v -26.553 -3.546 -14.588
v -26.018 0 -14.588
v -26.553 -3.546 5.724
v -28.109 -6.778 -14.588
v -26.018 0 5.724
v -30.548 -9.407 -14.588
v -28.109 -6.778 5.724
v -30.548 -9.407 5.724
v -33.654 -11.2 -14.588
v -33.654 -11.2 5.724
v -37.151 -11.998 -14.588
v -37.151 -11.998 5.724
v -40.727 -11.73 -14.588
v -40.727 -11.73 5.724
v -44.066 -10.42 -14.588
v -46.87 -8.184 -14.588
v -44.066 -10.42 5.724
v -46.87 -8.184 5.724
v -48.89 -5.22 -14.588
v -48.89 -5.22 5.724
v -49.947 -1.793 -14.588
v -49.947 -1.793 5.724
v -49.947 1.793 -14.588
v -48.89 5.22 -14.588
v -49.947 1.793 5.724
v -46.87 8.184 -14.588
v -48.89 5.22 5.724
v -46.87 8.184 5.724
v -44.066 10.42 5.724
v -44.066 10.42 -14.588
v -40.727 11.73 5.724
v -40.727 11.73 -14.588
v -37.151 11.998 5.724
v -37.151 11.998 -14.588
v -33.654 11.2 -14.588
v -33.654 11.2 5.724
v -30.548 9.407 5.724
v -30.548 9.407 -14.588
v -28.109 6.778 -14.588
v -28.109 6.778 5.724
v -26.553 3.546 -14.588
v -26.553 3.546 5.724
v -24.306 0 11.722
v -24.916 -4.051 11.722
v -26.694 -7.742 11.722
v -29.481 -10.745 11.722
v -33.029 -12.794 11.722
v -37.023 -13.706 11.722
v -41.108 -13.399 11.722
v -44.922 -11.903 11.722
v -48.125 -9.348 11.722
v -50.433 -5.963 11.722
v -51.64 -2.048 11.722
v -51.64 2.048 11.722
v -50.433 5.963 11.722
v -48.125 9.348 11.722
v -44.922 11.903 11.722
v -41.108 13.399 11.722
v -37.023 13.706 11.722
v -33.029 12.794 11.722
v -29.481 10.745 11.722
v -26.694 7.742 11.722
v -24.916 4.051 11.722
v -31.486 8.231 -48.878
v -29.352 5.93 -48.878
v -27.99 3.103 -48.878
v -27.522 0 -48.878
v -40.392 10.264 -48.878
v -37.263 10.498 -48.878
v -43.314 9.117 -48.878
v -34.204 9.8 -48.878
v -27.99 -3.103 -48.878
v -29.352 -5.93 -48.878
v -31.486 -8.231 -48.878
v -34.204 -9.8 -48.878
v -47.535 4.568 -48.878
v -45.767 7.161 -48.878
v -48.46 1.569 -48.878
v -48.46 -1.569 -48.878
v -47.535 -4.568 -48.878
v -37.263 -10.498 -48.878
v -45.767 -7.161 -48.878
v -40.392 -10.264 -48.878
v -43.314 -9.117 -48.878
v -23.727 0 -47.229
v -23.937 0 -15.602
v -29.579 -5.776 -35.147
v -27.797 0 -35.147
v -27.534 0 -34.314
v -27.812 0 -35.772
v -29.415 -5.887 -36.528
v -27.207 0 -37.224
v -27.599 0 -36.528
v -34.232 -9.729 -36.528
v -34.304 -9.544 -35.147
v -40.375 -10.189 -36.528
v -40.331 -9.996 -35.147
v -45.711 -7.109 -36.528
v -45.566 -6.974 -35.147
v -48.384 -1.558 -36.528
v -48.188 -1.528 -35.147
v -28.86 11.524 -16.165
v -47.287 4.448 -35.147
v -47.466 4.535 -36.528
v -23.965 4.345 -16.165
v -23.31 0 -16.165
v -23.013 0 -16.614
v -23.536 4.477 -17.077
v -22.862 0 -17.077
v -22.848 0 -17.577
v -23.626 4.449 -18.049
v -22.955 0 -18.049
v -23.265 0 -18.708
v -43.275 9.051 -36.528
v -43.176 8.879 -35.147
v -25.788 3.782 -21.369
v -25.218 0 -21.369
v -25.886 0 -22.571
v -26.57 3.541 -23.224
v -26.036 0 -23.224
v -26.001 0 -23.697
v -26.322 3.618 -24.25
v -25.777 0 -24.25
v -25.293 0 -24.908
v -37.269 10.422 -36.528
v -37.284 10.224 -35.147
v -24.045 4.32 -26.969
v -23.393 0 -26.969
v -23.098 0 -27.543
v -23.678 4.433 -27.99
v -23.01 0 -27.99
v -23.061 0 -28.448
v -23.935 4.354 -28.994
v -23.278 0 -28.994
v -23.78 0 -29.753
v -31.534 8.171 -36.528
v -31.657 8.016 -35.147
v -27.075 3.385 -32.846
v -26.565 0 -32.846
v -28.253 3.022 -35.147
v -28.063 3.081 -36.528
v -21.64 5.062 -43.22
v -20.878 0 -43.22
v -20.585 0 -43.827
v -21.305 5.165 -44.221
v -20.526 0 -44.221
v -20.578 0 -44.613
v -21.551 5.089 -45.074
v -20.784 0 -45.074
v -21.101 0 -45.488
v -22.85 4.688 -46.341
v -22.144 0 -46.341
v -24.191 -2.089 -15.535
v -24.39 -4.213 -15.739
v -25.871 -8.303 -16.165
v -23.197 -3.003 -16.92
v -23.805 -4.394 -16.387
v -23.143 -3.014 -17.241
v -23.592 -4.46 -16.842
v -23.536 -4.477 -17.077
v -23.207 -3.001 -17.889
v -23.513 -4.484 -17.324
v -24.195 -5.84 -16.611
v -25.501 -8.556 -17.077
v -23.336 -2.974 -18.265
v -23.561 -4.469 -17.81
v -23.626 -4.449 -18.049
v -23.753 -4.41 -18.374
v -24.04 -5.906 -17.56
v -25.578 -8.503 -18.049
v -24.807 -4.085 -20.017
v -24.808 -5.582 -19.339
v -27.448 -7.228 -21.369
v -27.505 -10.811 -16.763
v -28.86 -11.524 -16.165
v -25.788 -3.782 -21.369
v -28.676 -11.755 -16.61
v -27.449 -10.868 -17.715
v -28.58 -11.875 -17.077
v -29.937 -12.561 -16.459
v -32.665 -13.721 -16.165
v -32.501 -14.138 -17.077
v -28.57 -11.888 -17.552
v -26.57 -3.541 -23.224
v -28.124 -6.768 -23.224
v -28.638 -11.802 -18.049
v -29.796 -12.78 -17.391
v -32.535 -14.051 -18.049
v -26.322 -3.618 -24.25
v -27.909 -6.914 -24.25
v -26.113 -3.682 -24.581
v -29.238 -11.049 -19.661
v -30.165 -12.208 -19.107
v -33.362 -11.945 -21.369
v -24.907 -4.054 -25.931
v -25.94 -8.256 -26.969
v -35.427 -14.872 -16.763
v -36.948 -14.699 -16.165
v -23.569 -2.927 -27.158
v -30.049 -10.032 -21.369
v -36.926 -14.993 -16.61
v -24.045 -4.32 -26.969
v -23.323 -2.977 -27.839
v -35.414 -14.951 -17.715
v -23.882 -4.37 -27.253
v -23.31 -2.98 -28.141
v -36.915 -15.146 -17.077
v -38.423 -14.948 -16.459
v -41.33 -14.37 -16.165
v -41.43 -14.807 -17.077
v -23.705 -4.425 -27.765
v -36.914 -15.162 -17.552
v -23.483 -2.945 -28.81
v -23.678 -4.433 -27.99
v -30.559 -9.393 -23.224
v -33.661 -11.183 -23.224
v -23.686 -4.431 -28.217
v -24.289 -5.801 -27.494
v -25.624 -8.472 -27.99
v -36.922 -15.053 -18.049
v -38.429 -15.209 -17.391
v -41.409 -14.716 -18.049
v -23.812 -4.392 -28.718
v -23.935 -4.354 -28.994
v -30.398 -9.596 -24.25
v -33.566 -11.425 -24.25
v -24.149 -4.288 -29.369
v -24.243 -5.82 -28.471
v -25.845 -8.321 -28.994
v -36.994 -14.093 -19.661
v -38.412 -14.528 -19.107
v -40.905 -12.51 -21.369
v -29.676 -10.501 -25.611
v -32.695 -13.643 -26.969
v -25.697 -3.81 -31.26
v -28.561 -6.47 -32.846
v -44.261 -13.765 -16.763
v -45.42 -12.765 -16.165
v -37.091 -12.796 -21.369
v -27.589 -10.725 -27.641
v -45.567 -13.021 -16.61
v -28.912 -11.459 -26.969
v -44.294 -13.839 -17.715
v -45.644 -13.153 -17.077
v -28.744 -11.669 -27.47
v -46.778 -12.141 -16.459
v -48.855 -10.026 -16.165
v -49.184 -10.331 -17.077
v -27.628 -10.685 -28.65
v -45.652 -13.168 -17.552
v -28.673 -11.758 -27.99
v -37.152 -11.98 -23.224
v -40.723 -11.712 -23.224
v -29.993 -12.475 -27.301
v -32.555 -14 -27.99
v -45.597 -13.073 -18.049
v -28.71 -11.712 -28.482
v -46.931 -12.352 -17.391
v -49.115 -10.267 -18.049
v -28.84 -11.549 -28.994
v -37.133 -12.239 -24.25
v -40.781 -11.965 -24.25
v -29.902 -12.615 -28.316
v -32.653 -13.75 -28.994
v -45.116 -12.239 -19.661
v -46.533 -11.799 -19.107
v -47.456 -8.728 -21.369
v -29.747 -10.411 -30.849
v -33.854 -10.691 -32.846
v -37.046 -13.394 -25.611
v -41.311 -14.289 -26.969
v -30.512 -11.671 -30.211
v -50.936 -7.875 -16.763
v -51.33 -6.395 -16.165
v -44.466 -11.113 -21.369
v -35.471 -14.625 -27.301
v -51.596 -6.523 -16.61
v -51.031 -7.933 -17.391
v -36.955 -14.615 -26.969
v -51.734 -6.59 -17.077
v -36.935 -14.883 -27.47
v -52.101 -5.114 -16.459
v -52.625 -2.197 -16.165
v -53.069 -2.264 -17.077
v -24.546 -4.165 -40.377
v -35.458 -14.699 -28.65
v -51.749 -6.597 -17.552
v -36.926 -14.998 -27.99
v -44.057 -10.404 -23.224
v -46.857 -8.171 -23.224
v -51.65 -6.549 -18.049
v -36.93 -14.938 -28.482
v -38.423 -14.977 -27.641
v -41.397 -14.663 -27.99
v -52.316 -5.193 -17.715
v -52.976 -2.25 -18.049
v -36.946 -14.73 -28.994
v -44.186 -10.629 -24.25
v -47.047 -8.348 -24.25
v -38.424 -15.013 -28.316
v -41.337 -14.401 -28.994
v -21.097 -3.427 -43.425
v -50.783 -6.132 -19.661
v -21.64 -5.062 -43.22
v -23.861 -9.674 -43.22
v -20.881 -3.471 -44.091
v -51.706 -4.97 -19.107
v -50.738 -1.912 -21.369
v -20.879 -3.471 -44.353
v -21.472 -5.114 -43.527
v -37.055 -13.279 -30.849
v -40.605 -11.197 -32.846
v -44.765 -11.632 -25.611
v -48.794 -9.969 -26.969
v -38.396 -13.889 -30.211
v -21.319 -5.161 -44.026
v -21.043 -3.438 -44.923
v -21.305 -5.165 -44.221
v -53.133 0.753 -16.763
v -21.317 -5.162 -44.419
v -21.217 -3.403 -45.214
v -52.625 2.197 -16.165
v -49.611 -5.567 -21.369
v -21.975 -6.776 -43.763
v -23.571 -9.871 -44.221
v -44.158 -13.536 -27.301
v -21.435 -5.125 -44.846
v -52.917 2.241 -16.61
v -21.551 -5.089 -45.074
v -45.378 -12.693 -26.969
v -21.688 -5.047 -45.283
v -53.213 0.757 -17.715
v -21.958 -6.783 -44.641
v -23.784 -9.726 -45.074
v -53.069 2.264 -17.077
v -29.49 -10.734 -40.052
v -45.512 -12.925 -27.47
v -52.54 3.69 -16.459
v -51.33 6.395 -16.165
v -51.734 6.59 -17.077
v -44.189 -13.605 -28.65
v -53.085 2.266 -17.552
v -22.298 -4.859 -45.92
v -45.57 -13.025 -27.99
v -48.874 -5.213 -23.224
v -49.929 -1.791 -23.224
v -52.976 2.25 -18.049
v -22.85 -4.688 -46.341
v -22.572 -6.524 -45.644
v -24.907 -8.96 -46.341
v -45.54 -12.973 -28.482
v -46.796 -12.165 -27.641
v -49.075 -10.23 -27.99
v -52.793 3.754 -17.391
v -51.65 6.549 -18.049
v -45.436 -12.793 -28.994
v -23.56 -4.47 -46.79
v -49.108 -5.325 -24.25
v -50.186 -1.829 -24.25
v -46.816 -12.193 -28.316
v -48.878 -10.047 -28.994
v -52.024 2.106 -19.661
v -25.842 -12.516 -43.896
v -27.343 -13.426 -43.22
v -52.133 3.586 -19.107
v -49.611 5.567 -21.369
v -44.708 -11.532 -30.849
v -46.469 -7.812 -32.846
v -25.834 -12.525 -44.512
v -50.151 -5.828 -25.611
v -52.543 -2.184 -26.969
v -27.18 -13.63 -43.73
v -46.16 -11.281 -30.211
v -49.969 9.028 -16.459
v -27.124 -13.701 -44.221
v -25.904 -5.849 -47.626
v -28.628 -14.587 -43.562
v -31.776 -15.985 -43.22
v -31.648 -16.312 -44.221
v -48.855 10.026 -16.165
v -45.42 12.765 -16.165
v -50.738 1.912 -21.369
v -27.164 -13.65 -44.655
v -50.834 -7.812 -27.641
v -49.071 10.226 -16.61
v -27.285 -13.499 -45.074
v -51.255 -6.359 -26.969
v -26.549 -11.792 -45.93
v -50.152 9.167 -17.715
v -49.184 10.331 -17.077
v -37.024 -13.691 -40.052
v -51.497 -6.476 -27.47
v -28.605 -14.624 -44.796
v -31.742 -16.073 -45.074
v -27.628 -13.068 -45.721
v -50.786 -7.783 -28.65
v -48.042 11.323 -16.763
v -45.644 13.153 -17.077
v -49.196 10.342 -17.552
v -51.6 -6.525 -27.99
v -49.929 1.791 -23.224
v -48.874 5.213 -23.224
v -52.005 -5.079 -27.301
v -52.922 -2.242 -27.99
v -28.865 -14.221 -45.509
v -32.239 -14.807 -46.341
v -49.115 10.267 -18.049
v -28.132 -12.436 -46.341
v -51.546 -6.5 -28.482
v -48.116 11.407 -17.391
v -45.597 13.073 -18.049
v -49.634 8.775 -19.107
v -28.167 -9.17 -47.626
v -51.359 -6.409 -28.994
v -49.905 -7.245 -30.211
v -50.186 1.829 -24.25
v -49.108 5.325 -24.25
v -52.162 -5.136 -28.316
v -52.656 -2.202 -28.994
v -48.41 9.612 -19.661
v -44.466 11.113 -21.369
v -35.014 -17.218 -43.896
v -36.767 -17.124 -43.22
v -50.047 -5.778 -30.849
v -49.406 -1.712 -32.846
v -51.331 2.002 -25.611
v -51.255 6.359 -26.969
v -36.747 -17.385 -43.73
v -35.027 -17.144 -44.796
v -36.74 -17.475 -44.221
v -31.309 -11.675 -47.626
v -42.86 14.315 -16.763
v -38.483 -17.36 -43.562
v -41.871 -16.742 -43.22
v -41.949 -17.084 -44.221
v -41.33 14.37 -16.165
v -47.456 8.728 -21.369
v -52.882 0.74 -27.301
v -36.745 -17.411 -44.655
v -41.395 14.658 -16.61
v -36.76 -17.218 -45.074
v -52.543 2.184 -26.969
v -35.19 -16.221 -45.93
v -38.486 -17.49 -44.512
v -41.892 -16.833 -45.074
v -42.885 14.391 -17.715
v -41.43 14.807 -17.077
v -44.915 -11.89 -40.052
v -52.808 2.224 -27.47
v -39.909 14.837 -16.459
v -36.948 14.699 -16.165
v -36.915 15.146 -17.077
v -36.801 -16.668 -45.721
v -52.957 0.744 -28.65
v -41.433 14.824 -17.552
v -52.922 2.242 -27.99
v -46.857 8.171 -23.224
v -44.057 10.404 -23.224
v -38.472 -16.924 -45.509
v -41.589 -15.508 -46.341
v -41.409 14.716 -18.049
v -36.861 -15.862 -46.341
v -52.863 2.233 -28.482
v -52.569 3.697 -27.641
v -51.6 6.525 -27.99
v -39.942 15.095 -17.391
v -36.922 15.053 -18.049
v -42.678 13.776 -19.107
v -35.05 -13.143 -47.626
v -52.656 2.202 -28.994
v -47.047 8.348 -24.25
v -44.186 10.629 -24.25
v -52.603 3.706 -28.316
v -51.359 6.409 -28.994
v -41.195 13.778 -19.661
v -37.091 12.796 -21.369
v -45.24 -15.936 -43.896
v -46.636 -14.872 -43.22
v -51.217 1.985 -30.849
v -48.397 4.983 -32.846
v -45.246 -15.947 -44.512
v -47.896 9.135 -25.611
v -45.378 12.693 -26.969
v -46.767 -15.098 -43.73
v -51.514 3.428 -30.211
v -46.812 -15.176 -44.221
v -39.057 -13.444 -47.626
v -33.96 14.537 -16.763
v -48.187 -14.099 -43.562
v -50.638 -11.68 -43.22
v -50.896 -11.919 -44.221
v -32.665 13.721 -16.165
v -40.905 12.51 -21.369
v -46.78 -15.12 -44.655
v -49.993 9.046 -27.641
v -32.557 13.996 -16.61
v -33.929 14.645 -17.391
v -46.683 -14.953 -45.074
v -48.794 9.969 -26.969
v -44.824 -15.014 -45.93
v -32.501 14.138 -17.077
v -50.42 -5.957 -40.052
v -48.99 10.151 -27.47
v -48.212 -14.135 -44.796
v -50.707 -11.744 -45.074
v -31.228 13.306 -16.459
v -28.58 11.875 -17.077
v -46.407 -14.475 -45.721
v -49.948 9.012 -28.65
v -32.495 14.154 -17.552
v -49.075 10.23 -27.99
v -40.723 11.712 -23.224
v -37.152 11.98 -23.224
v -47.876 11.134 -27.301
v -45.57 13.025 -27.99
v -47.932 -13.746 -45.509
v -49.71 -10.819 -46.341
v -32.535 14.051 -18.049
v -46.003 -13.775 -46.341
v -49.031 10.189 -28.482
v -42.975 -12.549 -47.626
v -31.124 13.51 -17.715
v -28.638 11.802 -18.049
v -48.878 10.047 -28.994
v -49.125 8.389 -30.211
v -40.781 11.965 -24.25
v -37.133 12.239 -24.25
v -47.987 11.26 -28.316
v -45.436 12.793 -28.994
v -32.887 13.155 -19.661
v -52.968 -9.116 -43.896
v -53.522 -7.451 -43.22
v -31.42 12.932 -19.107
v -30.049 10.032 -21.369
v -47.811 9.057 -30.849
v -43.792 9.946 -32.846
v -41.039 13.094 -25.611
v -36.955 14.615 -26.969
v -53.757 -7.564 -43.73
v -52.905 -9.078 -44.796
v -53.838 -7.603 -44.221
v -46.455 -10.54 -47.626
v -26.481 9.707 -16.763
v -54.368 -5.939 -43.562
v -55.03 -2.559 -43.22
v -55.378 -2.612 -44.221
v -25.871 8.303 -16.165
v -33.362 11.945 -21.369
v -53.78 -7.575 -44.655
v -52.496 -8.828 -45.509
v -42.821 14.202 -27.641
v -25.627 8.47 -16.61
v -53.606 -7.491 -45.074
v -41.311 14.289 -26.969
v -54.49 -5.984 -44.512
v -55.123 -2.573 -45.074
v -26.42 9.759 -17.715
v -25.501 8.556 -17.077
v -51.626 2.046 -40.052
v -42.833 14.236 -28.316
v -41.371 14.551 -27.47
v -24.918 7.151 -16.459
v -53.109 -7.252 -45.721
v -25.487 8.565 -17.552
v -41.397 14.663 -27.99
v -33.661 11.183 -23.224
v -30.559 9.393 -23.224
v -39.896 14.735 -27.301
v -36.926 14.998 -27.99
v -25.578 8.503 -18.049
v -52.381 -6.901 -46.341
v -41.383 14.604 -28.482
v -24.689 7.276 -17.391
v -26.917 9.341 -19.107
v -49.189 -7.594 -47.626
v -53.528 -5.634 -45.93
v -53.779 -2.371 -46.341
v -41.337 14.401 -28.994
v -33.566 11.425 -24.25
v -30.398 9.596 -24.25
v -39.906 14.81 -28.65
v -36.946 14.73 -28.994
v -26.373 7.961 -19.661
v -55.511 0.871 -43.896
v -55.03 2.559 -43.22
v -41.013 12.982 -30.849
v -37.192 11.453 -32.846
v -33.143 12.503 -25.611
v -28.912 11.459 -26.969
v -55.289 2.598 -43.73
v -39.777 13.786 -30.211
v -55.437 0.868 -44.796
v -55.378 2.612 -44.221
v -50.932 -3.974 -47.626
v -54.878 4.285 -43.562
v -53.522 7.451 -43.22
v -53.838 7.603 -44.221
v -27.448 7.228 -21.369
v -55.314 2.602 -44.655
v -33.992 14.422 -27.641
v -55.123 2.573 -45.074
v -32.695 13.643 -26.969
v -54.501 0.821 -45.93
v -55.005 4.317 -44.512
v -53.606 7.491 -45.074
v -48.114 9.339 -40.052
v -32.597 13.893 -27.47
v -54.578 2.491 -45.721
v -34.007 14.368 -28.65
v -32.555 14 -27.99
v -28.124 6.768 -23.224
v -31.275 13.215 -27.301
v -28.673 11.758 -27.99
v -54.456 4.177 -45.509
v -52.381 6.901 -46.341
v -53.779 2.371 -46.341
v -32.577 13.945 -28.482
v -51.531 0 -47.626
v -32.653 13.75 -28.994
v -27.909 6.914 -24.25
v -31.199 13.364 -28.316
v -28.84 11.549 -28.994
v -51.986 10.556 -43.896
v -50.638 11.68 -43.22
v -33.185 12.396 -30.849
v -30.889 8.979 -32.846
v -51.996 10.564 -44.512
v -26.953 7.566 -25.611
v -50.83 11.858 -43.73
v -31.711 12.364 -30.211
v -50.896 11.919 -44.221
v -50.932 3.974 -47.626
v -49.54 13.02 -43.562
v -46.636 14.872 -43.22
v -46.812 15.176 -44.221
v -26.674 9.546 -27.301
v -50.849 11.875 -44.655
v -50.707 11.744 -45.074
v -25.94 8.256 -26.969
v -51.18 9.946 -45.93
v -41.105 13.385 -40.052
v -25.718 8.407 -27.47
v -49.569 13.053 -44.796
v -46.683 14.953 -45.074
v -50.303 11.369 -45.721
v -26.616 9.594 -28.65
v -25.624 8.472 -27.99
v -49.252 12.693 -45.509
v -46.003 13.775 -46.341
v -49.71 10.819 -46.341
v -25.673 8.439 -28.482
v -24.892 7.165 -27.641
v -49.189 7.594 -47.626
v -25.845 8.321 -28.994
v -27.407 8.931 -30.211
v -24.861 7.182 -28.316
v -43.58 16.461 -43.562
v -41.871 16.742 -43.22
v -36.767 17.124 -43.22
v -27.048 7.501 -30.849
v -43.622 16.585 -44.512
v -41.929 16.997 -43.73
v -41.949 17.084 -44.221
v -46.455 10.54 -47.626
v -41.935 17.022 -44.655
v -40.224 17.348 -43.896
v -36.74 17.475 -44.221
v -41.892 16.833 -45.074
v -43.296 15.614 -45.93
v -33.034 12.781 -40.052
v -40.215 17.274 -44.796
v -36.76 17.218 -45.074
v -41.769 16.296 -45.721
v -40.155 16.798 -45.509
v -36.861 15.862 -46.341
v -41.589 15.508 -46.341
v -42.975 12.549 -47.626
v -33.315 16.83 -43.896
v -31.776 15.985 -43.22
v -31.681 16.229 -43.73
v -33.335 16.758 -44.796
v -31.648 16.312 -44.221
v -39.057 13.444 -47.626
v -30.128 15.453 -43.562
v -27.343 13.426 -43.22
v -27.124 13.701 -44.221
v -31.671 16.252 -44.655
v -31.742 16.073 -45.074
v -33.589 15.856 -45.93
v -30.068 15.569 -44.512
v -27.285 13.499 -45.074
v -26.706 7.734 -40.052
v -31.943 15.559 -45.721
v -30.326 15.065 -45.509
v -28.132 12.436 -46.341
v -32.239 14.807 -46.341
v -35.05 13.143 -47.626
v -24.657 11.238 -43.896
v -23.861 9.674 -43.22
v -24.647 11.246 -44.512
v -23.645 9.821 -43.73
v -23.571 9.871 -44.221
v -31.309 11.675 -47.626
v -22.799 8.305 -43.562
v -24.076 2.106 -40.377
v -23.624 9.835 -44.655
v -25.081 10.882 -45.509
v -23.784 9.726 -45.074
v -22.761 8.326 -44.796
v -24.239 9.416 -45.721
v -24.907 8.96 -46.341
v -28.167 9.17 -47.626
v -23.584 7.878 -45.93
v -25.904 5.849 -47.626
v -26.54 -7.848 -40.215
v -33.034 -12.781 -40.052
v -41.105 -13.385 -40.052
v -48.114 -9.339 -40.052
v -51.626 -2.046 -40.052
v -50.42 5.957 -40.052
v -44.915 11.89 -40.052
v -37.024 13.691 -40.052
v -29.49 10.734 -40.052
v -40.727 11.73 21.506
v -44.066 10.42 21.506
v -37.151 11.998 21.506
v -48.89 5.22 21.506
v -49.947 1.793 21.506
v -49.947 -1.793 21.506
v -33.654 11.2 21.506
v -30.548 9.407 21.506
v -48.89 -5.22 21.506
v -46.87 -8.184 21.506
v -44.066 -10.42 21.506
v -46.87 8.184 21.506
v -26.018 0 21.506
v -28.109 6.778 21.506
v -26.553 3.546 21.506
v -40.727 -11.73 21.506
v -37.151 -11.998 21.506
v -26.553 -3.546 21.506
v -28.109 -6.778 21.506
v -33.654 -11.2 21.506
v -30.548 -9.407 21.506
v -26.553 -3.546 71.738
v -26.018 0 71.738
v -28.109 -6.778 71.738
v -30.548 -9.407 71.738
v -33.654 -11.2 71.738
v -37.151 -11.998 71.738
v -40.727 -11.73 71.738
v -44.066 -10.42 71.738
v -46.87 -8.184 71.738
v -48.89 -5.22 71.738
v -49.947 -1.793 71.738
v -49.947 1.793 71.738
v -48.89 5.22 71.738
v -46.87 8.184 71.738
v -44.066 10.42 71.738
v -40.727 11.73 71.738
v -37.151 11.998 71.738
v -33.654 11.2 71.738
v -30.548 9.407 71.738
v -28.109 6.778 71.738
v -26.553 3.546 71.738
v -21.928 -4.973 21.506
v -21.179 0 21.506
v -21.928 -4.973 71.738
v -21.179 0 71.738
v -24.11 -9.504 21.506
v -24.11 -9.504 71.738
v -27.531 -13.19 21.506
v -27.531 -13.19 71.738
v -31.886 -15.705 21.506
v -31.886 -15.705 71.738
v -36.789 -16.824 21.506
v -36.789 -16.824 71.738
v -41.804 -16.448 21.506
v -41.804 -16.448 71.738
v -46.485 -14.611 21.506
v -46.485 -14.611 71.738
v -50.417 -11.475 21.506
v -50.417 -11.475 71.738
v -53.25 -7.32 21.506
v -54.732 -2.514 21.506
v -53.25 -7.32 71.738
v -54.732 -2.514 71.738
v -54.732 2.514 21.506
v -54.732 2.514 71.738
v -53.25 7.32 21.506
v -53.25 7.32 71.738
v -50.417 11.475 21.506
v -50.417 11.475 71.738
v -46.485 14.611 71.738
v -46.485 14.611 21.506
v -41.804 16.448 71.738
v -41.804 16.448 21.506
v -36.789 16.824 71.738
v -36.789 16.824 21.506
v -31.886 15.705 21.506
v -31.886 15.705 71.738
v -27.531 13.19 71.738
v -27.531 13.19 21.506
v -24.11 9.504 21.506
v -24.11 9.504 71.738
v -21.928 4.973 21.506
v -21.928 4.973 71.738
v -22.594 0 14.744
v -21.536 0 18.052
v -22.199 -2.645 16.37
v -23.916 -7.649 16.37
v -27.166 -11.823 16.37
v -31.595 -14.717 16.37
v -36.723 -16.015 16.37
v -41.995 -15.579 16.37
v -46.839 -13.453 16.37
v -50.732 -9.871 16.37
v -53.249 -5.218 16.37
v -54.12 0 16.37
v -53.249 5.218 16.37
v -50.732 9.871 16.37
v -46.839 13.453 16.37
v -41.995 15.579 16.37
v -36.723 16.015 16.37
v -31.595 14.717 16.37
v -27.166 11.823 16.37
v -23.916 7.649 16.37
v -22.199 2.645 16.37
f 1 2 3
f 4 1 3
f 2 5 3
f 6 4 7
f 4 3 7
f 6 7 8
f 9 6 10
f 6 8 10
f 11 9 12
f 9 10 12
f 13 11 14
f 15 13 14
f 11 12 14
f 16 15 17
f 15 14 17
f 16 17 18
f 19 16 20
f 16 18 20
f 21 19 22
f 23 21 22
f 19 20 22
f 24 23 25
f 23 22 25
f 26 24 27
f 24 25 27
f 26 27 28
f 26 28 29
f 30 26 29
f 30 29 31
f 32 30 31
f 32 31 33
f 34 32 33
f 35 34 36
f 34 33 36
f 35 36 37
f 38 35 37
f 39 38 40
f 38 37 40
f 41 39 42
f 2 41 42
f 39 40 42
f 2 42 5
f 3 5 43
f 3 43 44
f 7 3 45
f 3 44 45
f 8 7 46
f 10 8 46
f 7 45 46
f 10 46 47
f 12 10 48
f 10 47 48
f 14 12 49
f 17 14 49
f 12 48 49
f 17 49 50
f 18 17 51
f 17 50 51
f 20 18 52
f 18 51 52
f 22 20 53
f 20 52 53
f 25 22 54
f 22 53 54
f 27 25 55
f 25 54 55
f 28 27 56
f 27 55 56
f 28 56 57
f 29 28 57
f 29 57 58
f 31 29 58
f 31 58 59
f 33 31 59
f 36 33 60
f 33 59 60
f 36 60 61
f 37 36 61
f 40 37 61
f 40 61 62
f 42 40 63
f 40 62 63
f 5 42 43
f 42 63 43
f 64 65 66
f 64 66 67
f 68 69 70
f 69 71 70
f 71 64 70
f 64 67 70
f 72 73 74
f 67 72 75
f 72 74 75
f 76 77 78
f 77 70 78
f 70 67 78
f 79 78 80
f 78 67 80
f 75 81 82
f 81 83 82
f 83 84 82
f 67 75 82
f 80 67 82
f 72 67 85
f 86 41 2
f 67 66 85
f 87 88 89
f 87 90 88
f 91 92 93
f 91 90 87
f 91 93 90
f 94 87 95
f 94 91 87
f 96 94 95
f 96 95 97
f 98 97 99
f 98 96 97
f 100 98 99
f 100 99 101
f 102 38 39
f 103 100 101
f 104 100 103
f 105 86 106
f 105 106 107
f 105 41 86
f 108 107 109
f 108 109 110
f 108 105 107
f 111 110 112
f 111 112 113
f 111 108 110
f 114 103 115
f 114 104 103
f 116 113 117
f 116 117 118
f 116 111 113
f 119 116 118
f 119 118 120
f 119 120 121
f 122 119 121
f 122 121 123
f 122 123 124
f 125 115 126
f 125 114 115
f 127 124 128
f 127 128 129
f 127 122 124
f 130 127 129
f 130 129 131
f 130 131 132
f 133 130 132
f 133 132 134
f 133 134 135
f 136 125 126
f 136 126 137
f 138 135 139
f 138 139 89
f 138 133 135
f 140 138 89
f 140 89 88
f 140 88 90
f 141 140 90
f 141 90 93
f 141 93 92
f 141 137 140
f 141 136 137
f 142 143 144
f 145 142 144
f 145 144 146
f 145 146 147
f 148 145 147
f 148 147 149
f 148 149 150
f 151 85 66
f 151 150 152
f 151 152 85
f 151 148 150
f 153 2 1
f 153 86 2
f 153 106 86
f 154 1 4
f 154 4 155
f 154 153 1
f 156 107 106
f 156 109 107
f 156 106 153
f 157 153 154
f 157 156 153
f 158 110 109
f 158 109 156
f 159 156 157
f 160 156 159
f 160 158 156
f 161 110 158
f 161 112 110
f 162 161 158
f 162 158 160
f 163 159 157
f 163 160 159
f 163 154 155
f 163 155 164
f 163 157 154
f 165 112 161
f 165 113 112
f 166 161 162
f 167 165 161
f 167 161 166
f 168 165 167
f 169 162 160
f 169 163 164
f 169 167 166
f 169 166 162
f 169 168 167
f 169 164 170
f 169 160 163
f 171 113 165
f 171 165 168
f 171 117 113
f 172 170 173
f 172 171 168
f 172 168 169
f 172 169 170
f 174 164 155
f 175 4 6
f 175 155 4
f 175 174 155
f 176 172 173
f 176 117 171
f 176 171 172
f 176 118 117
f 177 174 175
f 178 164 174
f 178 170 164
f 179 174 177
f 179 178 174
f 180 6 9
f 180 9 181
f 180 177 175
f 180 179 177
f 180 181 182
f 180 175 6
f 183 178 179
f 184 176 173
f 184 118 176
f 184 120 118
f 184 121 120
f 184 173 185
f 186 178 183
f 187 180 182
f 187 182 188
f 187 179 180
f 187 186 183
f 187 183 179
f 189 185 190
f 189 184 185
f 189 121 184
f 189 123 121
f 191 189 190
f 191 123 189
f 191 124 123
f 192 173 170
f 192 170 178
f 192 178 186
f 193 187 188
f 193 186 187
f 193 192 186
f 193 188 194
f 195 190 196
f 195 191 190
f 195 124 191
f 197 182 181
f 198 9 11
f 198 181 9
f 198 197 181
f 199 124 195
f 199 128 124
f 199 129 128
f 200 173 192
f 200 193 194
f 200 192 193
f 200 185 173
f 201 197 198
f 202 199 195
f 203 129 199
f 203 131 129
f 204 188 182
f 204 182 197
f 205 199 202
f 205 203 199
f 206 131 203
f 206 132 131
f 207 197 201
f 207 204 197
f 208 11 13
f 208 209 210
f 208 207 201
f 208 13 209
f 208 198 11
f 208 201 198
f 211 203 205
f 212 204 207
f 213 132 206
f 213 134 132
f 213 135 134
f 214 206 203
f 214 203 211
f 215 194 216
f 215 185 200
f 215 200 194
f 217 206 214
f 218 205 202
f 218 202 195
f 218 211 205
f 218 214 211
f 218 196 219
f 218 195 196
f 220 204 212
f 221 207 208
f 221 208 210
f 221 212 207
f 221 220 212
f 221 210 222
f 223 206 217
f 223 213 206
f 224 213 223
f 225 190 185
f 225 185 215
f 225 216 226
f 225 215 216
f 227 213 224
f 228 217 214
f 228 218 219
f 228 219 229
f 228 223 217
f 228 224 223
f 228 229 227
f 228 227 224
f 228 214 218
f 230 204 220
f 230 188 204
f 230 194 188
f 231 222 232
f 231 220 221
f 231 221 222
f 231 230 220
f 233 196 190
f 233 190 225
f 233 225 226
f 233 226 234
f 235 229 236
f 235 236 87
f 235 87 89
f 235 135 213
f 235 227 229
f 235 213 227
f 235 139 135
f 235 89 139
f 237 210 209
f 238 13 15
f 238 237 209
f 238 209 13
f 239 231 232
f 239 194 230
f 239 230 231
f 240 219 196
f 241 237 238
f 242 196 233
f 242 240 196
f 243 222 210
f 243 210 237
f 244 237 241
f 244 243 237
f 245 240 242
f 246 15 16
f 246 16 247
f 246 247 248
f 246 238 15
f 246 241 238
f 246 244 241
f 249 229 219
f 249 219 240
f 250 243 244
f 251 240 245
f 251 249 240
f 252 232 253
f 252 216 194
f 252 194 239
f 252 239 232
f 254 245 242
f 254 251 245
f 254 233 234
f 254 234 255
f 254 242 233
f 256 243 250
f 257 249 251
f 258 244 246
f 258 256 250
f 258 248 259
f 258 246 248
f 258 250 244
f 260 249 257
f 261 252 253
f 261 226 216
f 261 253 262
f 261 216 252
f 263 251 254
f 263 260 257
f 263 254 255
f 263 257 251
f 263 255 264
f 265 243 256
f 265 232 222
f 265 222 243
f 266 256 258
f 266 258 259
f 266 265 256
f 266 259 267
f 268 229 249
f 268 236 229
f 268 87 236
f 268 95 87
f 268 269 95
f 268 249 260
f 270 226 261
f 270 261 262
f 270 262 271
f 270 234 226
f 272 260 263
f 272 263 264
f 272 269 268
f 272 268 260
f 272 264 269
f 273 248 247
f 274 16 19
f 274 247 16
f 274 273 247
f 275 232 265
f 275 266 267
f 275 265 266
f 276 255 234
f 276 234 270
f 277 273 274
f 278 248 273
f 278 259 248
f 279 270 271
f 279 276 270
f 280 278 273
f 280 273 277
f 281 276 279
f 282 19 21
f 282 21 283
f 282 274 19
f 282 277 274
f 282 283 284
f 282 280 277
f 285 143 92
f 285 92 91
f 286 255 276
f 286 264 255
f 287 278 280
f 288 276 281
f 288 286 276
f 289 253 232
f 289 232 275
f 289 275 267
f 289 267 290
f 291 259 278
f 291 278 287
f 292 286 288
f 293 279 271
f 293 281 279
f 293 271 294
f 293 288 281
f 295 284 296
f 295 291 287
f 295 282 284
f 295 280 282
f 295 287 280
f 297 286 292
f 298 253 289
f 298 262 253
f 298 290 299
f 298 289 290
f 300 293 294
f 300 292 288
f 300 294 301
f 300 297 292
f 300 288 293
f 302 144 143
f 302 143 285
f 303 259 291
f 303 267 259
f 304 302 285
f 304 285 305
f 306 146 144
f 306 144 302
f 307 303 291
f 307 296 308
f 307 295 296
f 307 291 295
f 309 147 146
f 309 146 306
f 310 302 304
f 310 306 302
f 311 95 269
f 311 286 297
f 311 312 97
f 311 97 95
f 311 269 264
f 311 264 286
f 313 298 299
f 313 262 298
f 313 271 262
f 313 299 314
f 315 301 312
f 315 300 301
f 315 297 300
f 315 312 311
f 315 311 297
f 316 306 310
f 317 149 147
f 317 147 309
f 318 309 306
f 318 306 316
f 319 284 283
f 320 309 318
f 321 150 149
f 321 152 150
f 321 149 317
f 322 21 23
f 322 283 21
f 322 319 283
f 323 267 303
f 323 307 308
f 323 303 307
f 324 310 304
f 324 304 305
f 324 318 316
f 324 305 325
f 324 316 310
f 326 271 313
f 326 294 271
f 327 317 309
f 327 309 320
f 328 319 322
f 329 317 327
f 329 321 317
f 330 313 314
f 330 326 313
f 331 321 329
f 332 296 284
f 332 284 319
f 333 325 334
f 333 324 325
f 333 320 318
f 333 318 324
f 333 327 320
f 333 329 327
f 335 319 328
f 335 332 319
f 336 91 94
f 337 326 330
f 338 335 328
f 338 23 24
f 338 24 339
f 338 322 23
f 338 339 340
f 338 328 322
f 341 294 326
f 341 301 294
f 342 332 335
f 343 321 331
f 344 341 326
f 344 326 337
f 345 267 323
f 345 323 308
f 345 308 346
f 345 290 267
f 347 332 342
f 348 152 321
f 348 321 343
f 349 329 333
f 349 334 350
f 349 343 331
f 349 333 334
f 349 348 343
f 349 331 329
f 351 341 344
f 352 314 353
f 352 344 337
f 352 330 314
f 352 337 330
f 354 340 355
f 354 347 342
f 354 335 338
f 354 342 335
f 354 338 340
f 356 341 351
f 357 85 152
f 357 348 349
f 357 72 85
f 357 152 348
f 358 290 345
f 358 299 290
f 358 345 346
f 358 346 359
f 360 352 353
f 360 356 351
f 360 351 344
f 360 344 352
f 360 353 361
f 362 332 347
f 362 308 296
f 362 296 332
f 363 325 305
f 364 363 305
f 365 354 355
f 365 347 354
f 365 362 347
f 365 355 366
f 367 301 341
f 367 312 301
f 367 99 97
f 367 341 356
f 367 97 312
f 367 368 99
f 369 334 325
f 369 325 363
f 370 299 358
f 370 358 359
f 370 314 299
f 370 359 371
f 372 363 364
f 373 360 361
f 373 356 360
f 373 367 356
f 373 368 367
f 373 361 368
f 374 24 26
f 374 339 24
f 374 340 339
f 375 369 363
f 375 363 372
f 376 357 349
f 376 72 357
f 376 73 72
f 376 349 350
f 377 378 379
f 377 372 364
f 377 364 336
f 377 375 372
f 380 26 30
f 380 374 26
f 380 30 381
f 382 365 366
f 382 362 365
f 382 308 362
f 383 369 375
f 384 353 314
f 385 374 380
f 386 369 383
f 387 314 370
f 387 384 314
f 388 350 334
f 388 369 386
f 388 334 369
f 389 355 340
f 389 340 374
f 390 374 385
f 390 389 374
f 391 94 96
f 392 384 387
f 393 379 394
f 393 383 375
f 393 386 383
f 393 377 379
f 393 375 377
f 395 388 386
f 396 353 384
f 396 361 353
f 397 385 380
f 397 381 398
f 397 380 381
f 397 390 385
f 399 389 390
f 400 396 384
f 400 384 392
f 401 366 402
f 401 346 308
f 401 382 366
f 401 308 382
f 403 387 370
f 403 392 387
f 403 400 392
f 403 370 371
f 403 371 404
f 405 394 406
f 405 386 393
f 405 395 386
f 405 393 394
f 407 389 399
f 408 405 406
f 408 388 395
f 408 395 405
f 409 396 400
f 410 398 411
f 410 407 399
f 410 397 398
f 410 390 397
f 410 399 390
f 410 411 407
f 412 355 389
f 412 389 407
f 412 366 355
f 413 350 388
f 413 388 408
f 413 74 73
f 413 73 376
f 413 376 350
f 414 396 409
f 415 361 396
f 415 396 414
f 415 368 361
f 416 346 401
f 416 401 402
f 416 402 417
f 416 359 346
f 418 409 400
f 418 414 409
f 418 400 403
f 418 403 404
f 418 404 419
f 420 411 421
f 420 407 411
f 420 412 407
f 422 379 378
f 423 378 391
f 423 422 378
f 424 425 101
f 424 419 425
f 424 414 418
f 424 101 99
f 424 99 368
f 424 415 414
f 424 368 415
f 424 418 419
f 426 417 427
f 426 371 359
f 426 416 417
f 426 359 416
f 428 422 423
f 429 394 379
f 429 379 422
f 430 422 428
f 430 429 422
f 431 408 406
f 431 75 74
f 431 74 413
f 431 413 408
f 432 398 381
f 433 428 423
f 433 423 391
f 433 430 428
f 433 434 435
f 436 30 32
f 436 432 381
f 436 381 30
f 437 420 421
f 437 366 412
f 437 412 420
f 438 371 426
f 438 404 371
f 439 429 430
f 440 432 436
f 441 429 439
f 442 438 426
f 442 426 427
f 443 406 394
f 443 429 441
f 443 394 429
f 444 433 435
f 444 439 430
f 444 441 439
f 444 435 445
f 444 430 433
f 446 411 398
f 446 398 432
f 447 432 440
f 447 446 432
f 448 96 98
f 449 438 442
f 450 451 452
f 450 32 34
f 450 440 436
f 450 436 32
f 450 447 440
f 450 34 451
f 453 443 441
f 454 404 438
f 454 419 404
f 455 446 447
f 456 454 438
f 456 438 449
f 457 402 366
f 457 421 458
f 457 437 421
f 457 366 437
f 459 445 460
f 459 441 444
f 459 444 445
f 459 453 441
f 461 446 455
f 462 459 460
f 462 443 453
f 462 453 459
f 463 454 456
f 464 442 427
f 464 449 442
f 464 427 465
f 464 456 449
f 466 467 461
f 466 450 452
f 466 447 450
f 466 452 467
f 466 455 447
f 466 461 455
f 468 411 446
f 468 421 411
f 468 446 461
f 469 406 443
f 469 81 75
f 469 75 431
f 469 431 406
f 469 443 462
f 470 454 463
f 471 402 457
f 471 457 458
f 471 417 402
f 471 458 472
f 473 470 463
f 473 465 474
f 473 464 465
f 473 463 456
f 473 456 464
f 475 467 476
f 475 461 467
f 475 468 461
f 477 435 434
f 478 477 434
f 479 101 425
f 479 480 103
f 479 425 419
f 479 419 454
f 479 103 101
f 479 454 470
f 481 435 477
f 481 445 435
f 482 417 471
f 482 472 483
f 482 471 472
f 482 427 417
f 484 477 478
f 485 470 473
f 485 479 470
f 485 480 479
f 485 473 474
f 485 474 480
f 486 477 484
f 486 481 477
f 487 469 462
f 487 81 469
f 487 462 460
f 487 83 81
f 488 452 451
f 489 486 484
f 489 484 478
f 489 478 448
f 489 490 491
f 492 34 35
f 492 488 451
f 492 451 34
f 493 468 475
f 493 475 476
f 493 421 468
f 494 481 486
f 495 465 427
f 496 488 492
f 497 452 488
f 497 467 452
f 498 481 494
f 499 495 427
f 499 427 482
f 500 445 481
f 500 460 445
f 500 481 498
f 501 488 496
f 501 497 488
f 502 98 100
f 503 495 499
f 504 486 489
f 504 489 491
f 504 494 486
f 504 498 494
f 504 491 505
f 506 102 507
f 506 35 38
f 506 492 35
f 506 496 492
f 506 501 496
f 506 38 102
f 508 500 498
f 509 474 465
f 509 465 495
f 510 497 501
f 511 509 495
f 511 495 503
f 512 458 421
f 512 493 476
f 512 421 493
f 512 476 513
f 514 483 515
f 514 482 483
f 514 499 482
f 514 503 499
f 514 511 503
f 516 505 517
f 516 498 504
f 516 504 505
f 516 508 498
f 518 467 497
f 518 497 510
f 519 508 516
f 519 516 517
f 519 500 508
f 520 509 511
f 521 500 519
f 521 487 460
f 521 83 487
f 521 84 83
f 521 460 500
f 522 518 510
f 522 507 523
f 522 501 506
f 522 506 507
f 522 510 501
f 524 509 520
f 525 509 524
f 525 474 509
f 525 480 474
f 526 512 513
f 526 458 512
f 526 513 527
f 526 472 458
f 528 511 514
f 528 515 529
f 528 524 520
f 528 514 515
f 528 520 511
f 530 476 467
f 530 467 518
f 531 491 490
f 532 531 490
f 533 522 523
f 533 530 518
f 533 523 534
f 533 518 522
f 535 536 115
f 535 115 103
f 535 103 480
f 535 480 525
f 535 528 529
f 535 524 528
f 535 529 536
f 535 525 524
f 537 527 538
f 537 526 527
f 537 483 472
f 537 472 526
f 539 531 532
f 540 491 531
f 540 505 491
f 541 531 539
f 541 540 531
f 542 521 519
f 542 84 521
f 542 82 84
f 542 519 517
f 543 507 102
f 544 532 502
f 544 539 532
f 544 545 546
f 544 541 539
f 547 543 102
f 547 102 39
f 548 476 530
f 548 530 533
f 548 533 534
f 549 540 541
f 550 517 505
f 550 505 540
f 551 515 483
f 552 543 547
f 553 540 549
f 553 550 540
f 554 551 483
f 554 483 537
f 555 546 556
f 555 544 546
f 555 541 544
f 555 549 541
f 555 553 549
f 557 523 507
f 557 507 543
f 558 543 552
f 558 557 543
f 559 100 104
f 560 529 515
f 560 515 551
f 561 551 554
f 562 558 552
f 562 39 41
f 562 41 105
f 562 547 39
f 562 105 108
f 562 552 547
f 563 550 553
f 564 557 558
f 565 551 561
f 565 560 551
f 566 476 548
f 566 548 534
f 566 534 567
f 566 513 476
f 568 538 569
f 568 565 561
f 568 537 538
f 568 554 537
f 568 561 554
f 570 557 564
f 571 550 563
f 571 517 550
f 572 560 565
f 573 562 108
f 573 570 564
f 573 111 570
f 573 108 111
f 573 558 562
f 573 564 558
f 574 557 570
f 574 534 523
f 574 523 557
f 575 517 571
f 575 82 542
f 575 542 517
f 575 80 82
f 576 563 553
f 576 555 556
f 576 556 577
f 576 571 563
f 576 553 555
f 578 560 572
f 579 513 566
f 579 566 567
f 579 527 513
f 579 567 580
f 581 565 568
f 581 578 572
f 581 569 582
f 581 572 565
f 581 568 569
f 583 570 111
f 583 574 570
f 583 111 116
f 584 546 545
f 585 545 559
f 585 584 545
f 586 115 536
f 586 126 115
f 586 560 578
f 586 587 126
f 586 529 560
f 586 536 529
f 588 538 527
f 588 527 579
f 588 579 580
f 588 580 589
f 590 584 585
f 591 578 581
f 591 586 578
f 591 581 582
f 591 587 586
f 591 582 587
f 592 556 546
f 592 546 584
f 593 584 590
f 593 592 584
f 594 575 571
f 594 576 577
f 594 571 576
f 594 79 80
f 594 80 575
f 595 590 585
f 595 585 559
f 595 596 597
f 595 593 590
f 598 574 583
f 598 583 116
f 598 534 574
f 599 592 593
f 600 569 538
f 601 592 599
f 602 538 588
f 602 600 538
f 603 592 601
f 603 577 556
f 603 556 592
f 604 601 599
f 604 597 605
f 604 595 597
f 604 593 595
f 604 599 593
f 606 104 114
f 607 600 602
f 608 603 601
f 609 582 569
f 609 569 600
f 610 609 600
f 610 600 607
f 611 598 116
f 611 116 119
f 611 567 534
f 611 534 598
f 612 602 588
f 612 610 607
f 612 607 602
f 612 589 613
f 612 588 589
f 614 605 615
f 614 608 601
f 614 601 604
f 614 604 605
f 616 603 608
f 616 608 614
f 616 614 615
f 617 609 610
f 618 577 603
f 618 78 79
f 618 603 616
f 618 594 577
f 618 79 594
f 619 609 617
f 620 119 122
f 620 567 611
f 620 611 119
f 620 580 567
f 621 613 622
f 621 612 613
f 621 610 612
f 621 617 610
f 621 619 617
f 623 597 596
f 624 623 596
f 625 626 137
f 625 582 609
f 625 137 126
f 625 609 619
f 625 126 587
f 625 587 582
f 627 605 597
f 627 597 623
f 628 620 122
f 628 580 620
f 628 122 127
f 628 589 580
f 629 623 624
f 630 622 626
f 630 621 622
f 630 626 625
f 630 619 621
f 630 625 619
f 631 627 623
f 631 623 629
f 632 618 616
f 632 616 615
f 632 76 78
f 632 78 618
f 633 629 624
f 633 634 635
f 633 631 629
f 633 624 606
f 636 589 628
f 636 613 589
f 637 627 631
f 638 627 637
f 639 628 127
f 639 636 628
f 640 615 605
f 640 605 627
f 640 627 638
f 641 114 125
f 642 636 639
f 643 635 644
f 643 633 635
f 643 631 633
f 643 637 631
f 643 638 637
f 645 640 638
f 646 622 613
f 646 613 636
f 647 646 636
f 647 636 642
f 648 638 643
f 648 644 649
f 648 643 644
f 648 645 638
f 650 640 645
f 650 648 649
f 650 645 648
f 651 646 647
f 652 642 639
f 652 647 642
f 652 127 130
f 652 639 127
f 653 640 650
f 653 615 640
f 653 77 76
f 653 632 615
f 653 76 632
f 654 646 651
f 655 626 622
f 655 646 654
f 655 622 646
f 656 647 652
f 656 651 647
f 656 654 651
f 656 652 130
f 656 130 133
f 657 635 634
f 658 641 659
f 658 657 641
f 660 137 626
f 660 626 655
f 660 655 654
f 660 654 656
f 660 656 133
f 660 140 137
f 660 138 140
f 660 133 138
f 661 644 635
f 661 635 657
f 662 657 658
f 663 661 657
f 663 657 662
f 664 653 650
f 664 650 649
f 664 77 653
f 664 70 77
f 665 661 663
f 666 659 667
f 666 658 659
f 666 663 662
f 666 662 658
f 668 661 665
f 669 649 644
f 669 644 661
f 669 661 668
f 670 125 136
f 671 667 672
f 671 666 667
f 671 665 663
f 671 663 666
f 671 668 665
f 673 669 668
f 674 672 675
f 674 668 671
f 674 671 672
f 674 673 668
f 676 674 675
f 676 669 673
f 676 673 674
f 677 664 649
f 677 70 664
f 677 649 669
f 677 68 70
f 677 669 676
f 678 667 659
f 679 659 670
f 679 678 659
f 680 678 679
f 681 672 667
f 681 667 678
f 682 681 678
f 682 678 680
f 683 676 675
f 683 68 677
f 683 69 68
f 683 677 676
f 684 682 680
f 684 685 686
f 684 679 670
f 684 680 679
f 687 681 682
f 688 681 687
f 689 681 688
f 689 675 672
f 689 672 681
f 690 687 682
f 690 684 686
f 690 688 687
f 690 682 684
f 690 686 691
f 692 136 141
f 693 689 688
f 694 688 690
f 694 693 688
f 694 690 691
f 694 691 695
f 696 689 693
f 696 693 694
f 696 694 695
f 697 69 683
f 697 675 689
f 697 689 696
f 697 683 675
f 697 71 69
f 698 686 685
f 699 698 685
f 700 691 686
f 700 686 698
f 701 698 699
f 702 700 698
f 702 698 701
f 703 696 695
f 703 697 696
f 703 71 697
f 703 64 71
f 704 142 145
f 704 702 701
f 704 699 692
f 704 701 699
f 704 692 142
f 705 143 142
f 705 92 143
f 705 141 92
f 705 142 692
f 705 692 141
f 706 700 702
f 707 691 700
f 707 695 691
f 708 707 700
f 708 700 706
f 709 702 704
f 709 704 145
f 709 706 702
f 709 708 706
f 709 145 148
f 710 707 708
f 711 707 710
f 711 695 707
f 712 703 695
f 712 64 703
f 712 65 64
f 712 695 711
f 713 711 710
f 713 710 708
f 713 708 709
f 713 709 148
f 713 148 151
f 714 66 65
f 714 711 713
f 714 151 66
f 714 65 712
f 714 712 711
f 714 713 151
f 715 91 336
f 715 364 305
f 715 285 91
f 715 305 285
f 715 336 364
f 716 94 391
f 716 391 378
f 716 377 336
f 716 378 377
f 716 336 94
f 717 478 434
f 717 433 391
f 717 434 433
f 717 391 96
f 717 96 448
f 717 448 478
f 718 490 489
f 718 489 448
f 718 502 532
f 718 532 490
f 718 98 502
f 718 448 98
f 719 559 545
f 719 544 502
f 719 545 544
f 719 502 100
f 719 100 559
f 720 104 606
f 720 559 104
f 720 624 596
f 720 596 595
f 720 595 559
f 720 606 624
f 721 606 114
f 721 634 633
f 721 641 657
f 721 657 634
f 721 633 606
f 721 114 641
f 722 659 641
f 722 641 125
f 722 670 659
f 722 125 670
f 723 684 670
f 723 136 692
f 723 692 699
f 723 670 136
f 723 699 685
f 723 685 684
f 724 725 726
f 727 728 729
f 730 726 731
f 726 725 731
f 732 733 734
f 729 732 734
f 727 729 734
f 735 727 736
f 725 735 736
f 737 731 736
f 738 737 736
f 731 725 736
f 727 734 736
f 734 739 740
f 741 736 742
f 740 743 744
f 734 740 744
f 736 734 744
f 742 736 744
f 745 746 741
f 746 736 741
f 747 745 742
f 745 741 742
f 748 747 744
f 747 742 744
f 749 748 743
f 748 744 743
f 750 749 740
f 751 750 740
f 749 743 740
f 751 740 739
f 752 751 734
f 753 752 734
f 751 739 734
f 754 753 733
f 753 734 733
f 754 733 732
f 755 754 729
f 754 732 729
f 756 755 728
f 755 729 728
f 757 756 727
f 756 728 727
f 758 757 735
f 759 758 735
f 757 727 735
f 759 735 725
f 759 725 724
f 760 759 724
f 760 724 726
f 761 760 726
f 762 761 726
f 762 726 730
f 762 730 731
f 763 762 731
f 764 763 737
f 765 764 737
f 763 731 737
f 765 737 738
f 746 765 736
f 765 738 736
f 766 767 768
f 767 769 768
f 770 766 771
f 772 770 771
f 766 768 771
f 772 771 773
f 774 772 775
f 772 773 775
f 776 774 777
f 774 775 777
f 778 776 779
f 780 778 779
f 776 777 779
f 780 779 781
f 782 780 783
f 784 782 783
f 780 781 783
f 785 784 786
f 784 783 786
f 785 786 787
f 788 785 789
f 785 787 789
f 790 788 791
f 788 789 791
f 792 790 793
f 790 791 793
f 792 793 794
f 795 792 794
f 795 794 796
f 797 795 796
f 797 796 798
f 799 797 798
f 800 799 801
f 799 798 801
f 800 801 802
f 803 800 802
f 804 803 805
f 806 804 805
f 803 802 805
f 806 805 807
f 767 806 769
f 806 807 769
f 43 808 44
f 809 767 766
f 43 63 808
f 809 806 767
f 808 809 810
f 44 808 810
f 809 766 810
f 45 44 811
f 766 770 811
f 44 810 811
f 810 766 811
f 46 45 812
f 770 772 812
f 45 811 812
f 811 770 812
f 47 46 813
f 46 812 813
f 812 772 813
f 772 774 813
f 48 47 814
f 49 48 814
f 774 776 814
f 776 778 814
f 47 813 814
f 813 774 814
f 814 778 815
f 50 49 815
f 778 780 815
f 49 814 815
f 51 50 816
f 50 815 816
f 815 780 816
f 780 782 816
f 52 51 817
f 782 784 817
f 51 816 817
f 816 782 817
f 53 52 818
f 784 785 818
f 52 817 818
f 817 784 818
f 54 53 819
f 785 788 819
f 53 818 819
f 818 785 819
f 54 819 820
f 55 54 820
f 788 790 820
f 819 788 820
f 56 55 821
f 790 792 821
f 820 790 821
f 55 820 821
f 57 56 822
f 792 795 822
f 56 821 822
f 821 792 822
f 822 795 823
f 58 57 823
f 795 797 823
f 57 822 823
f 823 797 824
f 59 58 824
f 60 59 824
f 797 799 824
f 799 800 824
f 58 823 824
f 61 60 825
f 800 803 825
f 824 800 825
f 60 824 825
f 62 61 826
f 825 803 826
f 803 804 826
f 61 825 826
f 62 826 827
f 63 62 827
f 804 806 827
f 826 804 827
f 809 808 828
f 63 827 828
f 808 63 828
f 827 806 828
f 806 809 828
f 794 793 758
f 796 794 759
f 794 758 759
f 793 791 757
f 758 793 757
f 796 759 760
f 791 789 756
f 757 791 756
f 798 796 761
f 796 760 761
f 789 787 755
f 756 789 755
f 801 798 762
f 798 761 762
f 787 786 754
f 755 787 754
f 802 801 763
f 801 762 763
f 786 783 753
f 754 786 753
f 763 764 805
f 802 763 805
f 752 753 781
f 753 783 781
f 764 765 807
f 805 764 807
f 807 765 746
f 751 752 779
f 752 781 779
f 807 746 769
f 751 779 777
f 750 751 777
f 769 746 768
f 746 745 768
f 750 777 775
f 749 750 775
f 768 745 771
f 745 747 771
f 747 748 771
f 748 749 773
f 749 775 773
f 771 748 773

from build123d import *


with BuildPart() as f1:
    # F0 (on Front) → F1 (revolve)
    with BuildSketch(Plane.XZ):
        with BuildLine():
            Line((-26.0182898492, 5.7244500987), (-24.3058805849, 11.7220224141))
            ThreePointArc((-24.3058805849, 11.7220224141), (-21.979591378, 16.3704601156), (-21.1788231733, 21.506447345))
            Line((-21.1788231733, 21.506447345), (-21.1788231733, 71.7382878065))
            Line((-21.1788231733, 71.7382878065), (-26.0182898492, 71.7382878065))
            Line((-26.0182898492, 71.7382878065), (-26.0182898492, 21.506447345))
            Line((-26.0182898492, 21.506447345), (-38.0498692393, 21.506447345))
            Line((-38.0498692393, 21.506447345), (-38.0498692393, -48.8782897592))
            Line((-38.0498692393, -48.8782897592), (-27.5222361088, -48.8782897592))
            add(Edge.make_bspline(
                [(-26.0182898492, -14.5882898942), (-23.305044616, -15.5524146318), (-21.4055576786, -18.0960485839), (-28.7584352596, -23.8301011929), (-19.316895301, -28.1156810521), (-33.3537949524, -35.970450647), (-15.7526736038, -44.0802165493), (-23.6606204493, -47.2933194957), (-27.5222361088, -48.8782897592)],
                knots=[0, 0, 0, 0, 0.1337832997, 0.2873849573, 0.4311076344, 0.6155235378, 0.8189732636, 1, 1, 1, 1], degree=3))
            Line((-26.0182898492, -14.5882898942), (-26.0182898492, 5.7244500987))
        make_face()
    revolve(axis=Axis((-38.0498692393, 0, -13.6859212071), (0, 0, -1)))


solid = f1.part
